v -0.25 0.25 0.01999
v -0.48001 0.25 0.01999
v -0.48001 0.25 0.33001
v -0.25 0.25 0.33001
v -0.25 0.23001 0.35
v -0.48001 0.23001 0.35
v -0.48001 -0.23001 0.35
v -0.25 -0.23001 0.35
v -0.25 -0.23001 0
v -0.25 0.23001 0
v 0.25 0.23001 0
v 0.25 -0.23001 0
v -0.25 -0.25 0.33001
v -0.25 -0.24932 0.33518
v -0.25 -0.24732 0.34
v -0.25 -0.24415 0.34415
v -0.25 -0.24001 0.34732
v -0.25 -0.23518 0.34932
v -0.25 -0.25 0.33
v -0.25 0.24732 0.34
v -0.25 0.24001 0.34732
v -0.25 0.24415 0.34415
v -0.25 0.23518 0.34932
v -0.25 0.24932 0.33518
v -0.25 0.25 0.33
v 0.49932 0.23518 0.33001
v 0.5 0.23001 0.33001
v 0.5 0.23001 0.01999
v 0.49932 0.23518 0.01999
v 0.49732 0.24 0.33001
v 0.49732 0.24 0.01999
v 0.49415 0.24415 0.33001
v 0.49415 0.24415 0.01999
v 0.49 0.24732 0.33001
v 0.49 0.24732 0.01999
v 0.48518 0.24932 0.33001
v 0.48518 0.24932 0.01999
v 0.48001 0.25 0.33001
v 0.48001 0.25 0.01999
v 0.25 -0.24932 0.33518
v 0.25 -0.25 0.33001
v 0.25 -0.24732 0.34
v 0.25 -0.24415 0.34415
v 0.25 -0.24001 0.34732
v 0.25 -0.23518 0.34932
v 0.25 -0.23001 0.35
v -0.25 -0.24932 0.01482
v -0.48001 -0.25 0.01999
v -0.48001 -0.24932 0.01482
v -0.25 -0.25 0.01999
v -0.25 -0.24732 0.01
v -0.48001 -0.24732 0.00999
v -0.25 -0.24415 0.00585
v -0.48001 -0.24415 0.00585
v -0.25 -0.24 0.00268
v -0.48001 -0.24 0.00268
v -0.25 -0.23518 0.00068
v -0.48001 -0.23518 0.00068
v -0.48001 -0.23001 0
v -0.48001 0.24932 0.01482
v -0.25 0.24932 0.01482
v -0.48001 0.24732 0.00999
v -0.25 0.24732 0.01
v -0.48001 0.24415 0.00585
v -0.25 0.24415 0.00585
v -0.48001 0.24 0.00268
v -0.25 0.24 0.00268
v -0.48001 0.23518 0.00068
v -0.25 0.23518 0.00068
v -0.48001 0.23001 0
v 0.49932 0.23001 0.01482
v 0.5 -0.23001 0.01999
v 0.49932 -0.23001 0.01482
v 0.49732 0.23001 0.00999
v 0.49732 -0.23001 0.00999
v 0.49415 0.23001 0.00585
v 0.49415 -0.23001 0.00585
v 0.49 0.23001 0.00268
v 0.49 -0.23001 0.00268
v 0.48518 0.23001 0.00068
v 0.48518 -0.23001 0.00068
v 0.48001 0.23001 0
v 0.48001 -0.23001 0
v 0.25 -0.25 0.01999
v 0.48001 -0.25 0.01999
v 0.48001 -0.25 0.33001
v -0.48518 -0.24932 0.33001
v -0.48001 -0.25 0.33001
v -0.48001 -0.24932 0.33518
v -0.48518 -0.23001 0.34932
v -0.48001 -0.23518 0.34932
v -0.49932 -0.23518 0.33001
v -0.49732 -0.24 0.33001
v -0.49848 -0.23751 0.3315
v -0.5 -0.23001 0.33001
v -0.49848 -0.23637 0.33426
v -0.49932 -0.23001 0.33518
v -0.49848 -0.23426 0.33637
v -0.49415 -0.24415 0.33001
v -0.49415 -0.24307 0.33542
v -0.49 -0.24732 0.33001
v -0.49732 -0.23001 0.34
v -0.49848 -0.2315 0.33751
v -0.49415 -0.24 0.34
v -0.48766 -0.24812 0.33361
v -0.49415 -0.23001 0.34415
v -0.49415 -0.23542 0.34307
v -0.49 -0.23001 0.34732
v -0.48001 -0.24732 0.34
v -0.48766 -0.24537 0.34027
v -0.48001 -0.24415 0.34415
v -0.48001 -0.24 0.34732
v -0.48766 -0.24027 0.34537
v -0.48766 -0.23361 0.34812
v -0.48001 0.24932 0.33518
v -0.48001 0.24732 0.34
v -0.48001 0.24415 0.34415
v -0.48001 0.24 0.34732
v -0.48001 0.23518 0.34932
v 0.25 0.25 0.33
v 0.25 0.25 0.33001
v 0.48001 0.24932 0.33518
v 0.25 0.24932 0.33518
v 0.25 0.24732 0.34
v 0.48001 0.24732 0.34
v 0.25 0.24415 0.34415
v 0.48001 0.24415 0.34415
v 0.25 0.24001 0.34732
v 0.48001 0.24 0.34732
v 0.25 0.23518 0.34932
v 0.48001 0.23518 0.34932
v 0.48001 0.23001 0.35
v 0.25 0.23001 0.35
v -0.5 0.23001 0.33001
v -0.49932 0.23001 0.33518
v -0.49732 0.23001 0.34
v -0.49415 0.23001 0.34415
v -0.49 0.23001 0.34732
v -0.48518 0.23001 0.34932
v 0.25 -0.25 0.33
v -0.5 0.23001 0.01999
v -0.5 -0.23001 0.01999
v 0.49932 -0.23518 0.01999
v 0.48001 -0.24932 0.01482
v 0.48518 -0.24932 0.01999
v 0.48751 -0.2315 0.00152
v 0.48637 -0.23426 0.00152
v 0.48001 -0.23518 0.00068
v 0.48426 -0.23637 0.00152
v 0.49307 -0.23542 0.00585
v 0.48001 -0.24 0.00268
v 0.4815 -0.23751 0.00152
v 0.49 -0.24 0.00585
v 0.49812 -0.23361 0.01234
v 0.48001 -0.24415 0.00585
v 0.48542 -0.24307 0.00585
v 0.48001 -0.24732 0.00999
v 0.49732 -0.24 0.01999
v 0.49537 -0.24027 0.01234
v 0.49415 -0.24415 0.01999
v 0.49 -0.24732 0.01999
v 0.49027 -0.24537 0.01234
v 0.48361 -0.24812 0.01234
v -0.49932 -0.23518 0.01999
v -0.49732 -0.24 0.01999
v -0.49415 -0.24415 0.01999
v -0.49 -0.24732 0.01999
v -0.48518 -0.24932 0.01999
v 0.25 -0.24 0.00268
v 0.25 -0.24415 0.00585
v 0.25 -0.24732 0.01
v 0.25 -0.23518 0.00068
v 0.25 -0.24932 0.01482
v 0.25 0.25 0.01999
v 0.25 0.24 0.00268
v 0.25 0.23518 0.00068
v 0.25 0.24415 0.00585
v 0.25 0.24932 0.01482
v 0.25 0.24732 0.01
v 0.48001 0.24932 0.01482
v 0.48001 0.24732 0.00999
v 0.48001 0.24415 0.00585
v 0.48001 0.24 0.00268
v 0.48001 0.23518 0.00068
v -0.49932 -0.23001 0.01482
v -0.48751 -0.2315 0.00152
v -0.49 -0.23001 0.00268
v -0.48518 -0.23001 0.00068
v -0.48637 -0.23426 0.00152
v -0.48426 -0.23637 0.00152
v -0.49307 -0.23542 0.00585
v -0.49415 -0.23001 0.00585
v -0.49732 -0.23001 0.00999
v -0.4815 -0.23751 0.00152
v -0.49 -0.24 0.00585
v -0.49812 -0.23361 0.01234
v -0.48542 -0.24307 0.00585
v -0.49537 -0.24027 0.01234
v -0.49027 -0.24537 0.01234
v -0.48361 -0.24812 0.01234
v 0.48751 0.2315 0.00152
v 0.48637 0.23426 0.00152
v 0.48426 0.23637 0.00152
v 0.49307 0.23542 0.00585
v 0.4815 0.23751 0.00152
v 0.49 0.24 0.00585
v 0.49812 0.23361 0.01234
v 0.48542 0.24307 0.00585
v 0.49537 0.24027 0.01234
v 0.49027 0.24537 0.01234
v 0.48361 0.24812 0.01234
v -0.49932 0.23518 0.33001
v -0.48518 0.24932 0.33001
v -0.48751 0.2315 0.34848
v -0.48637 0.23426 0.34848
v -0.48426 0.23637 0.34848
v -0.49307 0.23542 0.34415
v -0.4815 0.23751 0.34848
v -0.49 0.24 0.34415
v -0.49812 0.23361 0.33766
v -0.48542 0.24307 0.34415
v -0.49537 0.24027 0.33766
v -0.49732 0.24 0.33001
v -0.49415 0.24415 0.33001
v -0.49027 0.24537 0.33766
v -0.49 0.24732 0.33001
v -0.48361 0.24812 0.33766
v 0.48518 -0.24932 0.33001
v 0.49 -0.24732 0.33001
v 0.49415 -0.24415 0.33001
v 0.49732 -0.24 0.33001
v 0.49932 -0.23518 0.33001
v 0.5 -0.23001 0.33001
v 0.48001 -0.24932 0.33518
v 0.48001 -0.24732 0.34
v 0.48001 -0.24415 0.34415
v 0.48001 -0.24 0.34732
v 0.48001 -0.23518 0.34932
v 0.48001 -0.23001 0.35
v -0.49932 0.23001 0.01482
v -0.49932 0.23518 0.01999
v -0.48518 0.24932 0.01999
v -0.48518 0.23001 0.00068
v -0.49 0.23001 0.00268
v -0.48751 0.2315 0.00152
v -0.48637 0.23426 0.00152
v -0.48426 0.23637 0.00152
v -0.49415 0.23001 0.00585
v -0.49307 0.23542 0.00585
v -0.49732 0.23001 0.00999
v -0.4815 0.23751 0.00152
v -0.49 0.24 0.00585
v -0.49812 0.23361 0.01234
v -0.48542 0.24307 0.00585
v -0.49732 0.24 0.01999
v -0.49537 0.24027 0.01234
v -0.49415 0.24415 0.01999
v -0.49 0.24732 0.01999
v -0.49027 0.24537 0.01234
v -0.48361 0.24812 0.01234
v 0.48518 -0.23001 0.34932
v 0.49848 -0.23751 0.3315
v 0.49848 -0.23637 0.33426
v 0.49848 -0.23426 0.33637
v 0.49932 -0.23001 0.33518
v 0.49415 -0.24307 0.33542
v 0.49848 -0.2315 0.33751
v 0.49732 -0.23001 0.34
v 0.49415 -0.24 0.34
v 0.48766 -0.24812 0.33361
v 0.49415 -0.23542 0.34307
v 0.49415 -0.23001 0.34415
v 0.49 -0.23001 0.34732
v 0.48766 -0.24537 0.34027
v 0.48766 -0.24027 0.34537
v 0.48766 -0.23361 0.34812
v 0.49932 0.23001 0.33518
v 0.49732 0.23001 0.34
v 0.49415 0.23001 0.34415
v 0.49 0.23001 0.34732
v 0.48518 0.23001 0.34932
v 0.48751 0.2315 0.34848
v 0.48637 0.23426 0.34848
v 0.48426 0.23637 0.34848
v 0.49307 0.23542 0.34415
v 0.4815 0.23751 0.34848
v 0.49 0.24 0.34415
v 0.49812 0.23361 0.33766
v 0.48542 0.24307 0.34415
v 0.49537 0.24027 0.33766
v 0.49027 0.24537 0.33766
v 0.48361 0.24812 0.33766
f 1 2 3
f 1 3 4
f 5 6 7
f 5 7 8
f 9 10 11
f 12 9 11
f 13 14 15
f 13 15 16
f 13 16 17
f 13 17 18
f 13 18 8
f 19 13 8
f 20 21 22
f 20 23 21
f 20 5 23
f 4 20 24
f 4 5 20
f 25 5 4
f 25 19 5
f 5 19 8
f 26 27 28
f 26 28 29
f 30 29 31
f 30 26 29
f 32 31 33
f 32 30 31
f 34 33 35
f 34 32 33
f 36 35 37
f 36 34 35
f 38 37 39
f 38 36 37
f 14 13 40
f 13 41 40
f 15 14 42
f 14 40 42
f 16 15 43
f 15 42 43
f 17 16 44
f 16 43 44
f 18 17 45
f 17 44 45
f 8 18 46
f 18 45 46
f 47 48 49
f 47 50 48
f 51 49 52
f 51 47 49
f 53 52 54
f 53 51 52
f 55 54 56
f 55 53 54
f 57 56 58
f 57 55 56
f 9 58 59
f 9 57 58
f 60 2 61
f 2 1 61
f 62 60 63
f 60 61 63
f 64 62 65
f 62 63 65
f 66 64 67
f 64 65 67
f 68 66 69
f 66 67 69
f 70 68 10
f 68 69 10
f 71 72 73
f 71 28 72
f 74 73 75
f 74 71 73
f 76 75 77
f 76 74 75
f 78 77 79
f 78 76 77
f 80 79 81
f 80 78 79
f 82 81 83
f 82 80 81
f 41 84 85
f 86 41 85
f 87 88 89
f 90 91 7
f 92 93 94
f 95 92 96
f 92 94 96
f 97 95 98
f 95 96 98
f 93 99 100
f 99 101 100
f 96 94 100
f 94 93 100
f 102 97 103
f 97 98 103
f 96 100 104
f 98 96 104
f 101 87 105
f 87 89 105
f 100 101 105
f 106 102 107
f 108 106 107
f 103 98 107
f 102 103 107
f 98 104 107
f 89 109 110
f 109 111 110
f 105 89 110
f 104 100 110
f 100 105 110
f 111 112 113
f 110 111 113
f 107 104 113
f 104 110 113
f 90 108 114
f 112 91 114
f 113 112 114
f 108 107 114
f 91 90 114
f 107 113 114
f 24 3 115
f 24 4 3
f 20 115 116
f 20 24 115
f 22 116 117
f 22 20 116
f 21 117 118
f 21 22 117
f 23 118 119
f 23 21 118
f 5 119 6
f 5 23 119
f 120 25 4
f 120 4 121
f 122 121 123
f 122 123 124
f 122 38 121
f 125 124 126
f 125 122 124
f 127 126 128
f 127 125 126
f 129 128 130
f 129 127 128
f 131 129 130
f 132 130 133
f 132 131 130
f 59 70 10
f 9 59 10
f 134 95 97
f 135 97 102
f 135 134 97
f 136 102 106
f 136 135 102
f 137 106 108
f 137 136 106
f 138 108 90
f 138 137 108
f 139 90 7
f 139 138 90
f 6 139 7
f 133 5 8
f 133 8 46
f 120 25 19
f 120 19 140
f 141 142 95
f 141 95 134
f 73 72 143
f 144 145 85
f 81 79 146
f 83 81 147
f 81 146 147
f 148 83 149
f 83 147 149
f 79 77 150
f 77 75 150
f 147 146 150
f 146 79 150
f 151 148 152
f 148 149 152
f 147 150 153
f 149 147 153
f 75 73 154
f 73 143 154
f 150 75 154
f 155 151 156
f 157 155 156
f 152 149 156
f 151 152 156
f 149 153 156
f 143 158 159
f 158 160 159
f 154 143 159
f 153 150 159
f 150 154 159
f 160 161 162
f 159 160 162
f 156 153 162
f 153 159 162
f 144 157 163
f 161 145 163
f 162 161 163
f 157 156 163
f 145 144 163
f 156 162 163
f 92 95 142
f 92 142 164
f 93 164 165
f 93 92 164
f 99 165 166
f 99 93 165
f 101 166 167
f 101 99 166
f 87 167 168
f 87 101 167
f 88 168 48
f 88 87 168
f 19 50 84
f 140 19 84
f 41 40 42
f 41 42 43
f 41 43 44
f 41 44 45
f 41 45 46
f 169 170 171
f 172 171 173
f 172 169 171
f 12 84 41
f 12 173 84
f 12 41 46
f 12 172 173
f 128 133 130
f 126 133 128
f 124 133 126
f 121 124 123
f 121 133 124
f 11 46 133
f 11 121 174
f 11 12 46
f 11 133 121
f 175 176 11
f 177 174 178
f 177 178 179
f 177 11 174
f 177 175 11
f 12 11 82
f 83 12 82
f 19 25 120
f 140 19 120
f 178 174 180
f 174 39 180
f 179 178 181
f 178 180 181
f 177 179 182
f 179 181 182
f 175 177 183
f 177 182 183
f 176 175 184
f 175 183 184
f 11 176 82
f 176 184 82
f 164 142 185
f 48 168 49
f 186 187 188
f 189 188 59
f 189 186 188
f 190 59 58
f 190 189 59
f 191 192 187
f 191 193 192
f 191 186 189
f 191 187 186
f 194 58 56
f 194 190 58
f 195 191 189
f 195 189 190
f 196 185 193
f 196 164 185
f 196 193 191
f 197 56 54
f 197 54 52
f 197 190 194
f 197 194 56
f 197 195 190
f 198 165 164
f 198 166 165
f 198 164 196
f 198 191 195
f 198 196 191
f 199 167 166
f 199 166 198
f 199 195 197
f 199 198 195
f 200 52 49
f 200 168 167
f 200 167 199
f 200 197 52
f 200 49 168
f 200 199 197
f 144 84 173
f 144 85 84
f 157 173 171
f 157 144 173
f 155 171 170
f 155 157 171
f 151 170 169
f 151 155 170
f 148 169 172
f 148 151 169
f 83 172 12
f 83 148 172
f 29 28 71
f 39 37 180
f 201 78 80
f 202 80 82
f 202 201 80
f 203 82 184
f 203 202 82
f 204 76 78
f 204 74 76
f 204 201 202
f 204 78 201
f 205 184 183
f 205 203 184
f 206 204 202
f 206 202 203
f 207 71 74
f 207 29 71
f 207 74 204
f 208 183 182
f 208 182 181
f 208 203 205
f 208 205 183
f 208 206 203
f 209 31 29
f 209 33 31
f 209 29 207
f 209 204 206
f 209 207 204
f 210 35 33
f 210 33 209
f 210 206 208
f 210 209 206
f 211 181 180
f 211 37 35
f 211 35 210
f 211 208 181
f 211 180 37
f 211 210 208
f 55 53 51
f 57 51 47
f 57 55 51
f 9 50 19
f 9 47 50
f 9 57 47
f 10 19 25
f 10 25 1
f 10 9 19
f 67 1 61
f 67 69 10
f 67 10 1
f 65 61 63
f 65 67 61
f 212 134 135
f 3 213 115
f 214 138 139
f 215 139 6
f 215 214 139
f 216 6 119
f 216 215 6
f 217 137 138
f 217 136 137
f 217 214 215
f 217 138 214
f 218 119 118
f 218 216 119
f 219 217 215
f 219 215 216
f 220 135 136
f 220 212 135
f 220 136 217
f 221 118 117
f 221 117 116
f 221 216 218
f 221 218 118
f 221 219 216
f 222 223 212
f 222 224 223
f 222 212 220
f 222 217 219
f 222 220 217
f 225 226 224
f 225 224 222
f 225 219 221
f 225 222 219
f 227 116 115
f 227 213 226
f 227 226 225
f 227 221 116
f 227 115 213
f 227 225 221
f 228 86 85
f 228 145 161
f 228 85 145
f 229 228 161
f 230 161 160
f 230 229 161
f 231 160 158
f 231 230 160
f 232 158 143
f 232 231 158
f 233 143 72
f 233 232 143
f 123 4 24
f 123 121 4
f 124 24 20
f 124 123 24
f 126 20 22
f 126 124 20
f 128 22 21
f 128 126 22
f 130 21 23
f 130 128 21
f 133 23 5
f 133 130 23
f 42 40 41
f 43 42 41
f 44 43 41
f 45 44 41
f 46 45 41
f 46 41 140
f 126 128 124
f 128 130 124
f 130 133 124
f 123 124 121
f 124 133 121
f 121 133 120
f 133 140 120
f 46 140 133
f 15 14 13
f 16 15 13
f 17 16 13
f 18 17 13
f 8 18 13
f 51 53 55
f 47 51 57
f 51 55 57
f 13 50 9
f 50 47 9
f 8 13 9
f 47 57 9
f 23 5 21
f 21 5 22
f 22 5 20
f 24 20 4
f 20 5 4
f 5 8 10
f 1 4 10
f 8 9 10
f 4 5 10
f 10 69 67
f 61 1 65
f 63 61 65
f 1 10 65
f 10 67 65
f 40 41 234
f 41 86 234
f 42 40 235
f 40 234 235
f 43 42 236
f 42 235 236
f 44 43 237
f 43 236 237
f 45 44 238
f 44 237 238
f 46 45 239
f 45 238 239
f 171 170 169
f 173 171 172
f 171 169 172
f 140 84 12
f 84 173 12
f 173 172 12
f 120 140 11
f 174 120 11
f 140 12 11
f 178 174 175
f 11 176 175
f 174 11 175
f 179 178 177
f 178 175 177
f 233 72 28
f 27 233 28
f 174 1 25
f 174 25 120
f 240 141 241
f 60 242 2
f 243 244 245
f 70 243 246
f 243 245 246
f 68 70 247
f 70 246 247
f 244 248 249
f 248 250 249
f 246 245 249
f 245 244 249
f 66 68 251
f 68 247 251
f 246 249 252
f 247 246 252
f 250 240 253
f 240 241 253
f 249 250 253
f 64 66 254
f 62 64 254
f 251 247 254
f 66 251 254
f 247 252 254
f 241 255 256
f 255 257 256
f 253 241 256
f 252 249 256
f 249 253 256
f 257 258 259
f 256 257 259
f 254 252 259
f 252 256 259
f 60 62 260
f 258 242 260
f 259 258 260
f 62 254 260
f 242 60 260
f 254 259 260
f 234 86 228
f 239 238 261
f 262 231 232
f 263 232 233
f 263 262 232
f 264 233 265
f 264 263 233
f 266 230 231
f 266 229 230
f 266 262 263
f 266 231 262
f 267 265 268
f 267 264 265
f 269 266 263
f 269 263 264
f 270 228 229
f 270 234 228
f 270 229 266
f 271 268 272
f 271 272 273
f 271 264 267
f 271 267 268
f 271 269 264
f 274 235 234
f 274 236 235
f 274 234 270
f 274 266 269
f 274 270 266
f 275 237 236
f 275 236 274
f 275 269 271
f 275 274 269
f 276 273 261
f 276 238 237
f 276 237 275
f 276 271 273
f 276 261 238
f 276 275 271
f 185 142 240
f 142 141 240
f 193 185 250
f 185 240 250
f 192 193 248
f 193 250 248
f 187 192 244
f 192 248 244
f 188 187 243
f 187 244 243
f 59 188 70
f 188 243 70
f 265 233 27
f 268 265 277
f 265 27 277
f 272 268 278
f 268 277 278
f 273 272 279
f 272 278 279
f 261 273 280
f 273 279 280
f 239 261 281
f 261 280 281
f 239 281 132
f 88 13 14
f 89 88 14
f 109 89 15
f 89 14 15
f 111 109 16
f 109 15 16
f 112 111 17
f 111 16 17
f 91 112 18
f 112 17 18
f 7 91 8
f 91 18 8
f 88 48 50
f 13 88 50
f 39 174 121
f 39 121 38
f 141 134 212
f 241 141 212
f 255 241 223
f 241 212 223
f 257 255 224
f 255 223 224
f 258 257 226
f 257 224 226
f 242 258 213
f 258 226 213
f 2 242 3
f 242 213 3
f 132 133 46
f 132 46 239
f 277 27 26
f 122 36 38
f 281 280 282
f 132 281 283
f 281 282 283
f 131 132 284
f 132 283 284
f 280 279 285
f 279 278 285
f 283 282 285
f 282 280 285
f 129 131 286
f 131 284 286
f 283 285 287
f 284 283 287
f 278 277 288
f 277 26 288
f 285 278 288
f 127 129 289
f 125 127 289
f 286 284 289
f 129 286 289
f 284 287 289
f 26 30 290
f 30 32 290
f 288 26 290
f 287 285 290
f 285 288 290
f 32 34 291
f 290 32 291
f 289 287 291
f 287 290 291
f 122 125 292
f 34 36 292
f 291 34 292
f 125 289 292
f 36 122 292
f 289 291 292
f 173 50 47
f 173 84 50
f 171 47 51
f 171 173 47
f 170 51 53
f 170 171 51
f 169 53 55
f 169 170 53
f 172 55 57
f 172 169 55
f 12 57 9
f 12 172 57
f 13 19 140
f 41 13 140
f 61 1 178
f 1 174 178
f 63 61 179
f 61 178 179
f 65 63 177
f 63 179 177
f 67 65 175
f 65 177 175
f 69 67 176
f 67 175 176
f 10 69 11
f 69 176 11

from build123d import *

# Parameters (mm, degrees)
F2_W     = 0.5
F2_H     = 0.5
F3_DEPTH = 0.33
F2_W_2   = 0.25
F4_DEPTH = 0.35
F5_DEPTH = 0.35
F6_DEPTH = 0.02
F7_R     = 0.01999
F7_2_R   = 0.01999
F7_3_R   = 0.01999
F7_4_R   = 0.01999


# Not quite as in the source:
# - a fillet or chamfer is up to 0.001 mm smaller than in the source, because OpenCascade refuses the exact size


with BuildPart() as f3:
    # F2 (on Top) → F3 (new body)
    with BuildSketch(Plane.XY):
        Rectangle(F2_W, F2_H)
    extrude(amount=F3_DEPTH)


with BuildPart() as f4:
    # F2 (on Top) → F4 (new body)
    with BuildSketch(Plane.XY):
        with Locations((-0.375, 0)):
            Rectangle(F2_W_2, F2_H)
    extrude(amount=F4_DEPTH)

    # F7 (radius 0.02 in the source; OpenCascade refuses exactly that, so slightly less here)
    f7_edges = [f4.edges().sort_by_distance(p)[0] for p in [
        (-0.375, -0.25, 0.35),
        (-0.5, 0.25, 0.175),
        (-0.5, -0.25, 0.175),
        (-0.5, 0, 0),
        (-0.5, 0, 0.35),
        (-0.375, 0.25, 0.35),
        (-0.375, 0.25, 0),
        (-0.375, -0.25, 0),
    ]]
    fillet(f7_edges, radius=F7_R)


with BuildPart() as f5:
    # F2 (on Top) → F5 (new body)
    with BuildSketch(Plane.XY):
        with Locations((0.375, 0)):
            Rectangle(F2_W_2, F2_H)
    extrude(amount=F5_DEPTH)

    # F7#2 (radius 0.02 in the source; OpenCascade refuses exactly that, so slightly less here)
    f7_2_edges = [f5.edges().sort_by_distance(p)[0] for p in [
        (0.375, -0.25, 0.35),
        (0.5, -0.25, 0.175),
        (0.5, 0.25, 0.175),
        (0.5, 0, 0),
        (0.5, 0, 0.35),
        (0.375, 0.25, 0.35),
        (0.375, 0.25, 0),
        (0.375, -0.25, 0),
    ]]
    fillet(f7_2_edges, radius=F7_2_R)


with BuildPart() as f6:
    # F6 (new): a face of the model
    f6_faces = [f3.part.faces().sort_by_distance(p)[0] for p in [
        (0, 0, 0.33),
    ]]
    extrude(f6_faces, amount=F6_DEPTH)

    # F7#4 (radius 0.02 in the source; OpenCascade refuses exactly that, so slightly less here)
    f7_4_edges = [f6.edges().sort_by_distance(p)[0] for p in [
        (0, -0.25, 0.35),
        (0, 0.25, 0.35),
    ]]
    fillet(f7_4_edges, radius=F7_4_R)


with BuildPart() as f3_1:
    add(f3.part)

    # F7#3 (radius 0.02 in the source; OpenCascade refuses exactly that, so slightly less here)
    f7_3_edges = [f3_1.edges().sort_by_distance(p)[0] for p in [
        (0, 0.25, 0),
        (0, -0.25, 0),
    ]]
    fillet(f7_3_edges, radius=F7_3_R)


solid = Compound([f4.part, f5.part, f6.part, f3_1.part])
